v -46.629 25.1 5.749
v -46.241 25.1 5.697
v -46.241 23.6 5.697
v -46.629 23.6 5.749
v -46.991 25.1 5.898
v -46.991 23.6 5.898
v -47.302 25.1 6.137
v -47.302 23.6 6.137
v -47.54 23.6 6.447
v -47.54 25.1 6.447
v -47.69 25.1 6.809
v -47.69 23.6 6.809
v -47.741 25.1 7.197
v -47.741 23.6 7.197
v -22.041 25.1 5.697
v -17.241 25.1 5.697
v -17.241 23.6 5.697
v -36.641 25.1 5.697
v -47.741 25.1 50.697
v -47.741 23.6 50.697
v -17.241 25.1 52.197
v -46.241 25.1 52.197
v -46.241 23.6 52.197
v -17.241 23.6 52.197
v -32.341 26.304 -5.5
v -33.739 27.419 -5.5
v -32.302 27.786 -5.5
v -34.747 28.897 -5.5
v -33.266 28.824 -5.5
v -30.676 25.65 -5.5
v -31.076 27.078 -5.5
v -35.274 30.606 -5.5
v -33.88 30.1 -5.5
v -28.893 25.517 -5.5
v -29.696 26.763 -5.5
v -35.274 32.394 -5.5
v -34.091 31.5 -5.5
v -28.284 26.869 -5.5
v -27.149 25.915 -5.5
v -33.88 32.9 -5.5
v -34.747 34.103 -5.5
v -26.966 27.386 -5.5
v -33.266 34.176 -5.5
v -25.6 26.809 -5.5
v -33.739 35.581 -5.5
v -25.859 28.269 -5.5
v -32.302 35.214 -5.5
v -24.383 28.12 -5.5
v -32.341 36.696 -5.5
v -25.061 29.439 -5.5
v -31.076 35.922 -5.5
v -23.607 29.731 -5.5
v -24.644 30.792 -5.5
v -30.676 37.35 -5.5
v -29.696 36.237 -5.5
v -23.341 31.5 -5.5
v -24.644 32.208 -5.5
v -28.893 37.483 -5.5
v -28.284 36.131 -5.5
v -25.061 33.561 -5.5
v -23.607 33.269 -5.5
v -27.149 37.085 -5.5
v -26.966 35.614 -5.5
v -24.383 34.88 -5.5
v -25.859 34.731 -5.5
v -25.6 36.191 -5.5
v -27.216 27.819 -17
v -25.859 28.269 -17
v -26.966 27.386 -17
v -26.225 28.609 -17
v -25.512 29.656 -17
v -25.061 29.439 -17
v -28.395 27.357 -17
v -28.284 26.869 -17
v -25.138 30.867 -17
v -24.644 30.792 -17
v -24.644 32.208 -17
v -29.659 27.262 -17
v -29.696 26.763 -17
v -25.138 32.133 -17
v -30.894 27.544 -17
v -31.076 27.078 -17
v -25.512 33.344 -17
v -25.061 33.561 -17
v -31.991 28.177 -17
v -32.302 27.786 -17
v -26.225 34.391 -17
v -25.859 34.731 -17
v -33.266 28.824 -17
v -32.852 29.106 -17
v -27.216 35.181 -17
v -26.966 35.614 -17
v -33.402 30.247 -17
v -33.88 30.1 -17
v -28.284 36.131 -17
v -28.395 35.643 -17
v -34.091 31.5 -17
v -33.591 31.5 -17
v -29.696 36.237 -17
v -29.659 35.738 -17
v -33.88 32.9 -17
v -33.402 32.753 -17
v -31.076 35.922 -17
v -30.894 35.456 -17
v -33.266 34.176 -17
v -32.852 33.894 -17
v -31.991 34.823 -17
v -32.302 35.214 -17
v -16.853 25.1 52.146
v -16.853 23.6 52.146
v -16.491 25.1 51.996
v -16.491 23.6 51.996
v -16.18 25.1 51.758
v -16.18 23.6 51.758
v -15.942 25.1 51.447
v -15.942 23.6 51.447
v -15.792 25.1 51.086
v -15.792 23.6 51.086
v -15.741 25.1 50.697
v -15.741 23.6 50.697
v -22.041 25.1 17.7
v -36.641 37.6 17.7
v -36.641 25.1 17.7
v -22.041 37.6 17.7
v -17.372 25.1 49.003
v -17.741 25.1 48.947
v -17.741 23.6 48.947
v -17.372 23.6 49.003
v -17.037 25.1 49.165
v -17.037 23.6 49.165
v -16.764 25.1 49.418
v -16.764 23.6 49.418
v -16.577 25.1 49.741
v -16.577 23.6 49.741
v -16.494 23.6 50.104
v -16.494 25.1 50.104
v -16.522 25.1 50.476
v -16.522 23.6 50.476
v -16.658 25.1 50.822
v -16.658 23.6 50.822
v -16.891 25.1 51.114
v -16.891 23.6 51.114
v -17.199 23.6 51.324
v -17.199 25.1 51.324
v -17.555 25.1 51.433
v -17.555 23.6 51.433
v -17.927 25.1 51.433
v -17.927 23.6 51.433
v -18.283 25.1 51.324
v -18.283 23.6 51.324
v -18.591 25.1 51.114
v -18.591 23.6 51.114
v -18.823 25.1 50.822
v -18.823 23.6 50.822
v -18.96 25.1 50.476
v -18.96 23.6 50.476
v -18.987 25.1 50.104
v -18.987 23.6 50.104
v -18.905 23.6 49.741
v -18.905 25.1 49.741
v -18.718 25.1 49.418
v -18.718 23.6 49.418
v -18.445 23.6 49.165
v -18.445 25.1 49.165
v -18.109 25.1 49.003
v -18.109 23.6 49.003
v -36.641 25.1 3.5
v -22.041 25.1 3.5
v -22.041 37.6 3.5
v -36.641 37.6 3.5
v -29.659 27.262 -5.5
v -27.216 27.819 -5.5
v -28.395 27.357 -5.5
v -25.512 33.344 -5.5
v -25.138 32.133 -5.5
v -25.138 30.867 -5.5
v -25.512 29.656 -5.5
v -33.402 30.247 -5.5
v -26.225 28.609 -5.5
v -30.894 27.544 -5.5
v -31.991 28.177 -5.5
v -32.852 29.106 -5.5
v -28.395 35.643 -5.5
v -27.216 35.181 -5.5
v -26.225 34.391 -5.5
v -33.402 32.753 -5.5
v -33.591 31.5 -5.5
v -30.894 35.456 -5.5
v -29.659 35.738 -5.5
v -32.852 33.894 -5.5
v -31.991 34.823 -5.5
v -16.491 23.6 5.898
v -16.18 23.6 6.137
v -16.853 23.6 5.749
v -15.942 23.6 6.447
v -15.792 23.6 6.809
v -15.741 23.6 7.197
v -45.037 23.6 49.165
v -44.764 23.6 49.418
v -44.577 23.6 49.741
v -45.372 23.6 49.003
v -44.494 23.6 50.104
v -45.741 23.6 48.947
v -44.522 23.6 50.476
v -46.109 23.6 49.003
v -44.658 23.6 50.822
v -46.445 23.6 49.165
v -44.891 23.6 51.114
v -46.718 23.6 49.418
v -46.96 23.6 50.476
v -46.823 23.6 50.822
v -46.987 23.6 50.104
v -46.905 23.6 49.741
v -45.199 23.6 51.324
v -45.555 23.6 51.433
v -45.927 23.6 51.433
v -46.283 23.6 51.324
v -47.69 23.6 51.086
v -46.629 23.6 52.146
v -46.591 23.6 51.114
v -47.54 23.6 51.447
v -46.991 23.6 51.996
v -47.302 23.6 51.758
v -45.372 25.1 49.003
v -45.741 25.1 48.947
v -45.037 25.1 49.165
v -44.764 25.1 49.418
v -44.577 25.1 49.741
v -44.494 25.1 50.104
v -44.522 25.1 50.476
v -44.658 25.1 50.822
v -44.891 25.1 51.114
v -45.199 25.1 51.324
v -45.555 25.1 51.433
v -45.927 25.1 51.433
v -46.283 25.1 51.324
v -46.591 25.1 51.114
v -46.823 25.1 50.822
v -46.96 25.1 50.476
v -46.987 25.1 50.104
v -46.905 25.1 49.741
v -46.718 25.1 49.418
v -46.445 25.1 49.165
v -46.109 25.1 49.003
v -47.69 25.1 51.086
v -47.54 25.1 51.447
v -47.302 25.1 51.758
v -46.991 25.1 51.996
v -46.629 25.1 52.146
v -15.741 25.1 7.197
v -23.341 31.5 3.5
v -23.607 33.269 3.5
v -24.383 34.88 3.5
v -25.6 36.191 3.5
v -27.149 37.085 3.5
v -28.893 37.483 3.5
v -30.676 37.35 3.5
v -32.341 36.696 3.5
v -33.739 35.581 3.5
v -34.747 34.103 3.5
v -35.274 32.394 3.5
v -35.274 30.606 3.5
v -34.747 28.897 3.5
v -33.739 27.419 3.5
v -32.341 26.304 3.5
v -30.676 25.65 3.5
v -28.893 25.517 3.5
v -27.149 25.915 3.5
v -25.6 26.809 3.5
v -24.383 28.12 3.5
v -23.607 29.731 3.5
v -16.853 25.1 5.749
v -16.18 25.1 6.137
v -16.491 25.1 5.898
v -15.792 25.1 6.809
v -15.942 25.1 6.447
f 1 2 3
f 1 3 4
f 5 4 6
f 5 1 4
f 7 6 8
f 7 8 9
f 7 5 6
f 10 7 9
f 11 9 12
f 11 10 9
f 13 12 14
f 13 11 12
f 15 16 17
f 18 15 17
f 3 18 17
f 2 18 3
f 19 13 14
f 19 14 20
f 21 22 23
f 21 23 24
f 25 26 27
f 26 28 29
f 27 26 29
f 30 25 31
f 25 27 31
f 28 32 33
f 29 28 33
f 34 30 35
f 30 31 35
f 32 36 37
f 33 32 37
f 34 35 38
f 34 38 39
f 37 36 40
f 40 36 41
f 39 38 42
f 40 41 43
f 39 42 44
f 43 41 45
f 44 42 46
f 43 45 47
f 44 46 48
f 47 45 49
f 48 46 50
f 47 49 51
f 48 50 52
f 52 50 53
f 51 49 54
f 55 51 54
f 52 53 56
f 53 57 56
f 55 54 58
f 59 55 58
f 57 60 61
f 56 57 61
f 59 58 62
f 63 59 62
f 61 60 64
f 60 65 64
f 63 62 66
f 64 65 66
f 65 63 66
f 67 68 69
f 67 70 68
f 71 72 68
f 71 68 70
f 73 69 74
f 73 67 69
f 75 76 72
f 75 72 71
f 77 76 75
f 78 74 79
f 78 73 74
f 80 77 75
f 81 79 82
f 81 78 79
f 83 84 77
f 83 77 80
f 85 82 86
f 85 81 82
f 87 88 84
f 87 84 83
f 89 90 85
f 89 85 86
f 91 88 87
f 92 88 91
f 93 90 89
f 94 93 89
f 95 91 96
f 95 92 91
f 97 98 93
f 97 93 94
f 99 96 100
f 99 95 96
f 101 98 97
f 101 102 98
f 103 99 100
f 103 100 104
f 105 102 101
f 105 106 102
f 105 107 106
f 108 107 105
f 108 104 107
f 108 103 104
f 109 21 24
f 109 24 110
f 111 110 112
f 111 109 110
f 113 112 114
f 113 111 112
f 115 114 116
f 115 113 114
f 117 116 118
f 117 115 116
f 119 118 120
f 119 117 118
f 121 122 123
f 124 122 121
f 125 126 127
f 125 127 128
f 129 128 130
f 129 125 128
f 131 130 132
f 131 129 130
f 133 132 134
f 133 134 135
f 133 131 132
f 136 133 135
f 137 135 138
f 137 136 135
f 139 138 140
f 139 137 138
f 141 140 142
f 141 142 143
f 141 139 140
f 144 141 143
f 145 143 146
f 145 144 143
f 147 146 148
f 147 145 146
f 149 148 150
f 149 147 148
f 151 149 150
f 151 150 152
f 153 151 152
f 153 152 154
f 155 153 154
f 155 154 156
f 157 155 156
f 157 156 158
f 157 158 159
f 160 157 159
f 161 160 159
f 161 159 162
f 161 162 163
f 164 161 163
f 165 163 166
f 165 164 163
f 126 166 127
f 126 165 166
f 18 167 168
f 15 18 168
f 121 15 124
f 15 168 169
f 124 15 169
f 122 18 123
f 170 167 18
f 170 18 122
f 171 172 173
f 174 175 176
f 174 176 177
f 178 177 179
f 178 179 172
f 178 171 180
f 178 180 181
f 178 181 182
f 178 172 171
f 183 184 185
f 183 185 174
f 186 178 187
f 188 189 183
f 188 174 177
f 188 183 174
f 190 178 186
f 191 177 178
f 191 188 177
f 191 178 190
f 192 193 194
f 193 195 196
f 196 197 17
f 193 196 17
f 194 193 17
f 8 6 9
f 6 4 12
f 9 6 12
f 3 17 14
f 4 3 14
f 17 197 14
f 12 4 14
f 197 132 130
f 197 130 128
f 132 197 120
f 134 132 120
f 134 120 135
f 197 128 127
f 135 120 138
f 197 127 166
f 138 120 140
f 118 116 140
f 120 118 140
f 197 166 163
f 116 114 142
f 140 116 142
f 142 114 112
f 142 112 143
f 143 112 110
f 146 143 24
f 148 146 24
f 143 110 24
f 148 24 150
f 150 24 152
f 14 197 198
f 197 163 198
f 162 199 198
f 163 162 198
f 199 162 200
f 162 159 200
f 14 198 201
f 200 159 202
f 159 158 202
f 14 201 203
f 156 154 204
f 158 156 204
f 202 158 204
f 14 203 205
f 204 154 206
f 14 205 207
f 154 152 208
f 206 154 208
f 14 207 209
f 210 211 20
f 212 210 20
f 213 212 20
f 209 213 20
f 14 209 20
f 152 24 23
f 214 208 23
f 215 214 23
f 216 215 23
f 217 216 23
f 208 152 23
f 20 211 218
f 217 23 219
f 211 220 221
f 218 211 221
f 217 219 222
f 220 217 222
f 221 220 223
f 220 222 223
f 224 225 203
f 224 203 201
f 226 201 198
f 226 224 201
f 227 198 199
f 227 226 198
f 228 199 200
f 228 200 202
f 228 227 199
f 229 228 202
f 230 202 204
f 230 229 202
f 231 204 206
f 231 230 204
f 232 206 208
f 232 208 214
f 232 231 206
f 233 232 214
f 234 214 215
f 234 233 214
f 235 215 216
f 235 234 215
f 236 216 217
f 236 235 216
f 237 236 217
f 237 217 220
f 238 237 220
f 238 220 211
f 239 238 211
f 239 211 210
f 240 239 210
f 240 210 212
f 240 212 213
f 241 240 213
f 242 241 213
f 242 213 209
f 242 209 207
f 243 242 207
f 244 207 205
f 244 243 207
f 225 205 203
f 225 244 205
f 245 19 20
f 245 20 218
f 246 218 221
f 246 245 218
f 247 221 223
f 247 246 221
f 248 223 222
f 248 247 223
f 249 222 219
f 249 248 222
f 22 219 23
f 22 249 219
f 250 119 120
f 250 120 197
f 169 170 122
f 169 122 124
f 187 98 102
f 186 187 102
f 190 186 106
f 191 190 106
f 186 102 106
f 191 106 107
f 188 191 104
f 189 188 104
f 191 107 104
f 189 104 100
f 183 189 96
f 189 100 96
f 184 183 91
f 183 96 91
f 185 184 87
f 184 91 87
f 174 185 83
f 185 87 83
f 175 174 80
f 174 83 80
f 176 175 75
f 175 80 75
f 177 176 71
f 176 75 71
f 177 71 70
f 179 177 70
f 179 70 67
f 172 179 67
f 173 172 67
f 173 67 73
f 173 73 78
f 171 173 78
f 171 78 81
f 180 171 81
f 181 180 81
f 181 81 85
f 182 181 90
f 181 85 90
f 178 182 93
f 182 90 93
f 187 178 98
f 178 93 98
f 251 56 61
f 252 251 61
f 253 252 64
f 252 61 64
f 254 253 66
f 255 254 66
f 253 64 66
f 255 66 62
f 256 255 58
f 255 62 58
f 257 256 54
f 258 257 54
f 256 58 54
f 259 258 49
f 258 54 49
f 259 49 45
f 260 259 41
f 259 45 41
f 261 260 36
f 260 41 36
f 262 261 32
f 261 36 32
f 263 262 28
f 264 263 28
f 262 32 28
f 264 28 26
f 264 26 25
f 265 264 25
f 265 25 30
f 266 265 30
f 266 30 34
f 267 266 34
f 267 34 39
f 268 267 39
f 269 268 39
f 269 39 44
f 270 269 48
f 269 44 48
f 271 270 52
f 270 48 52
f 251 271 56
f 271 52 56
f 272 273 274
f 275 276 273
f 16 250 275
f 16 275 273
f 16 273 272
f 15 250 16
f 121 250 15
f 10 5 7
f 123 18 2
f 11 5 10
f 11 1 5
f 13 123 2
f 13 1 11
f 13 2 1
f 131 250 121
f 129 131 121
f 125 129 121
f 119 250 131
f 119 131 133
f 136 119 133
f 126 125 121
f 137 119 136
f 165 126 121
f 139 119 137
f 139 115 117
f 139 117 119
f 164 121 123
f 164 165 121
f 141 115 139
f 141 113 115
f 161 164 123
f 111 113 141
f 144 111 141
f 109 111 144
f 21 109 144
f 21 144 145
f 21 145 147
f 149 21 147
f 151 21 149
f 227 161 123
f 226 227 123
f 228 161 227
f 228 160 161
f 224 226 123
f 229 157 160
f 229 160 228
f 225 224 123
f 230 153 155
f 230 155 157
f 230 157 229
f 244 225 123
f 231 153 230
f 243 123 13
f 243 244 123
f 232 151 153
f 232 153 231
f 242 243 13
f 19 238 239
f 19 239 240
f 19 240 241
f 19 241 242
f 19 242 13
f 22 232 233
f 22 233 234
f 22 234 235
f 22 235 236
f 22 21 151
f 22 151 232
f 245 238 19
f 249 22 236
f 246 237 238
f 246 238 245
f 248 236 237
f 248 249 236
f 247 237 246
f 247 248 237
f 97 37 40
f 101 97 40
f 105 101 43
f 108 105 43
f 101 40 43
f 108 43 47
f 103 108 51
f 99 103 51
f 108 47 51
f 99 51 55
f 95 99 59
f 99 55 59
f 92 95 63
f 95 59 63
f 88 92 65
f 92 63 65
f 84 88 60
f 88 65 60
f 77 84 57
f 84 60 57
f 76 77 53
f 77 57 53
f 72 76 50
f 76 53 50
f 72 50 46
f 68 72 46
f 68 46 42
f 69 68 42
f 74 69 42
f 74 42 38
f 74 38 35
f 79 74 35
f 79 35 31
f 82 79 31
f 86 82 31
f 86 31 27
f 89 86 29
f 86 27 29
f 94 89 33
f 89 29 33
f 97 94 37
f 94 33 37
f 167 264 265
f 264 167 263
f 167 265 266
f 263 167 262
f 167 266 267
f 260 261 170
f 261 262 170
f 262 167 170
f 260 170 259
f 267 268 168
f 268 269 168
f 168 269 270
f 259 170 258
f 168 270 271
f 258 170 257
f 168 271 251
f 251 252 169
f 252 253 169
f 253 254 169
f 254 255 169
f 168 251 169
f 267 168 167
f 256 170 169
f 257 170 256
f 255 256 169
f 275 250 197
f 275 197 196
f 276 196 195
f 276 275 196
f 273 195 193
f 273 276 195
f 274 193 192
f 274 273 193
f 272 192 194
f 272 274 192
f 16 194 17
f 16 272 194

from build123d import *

# Parameters (mm, degrees)
EXTRUDE_1_DEPTH      = 3.5
EXTRUDE_1_DEPTH_BACK = 5.5
SKETCH_1_R           = 6
SKETCH_2_R           = 4.75
EXTRUDE_2_DEPTH      = 11.5
SKETCH_3_R           = 4.25
CUT_EXTRUDE_1_DEPTH  = 11.5
SKETCH_4_W           = 14.6
SKETCH_4_H           = 12.5
EXTRUDE_3_DEPTH      = 14.2
SKETCH_5_R           = 1.25
EXTRUDE_4_DEPTH      = 1.5


with BuildPart() as part:
    # 草圖1 → 填料-伸長1 (new, two sides: drawn at the far end of the back side and taken through both)
    with BuildSketch(Plane.XY.offset(-EXTRUDE_1_DEPTH_BACK)):
        with Locations((-29.340909091, 31.5)):
            Circle(SKETCH_1_R)
    extrude(amount=EXTRUDE_1_DEPTH + EXTRUDE_1_DEPTH_BACK)

    # 草圖2 → 填料-伸長2 (add)
    with BuildSketch(Plane(origin=(0, 0, -5.5), x_dir=(-1, 0, 0), z_dir=(0, 0, -1))):
        with Locations((29.340909091, 31.5)):
            Circle(SKETCH_2_R)
    extrude(amount=EXTRUDE_2_DEPTH)

    # 草圖3 → 除料-伸長1 (cut)
    with BuildSketch(Plane(origin=(0, 0, -17), x_dir=(-1, 0, 0), z_dir=(0, 0, -1))):
        with Locations((29.340909091, 31.5)):
            Circle(SKETCH_3_R)
    extrude(amount=-CUT_EXTRUDE_1_DEPTH, mode=Mode.SUBTRACT)

    # 草圖4 → 填料-伸長3 (add)
    with BuildSketch(Plane.XY.offset(3.5)):
        with Locations((-29.340909091, 31.35)):
            Rectangle(SKETCH_4_W, SKETCH_4_H)
    extrude(amount=EXTRUDE_3_DEPTH)

    # 草圖5 → 填料-伸長4 (add)
    with BuildSketch(Plane.XZ.offset(-25.1)):
        with BuildLine():
            Line((-17.240909091, 5.697422491), (-46.240909091, 5.697422491))
            ThreePointArc((-46.240909091, 5.697422491), (-47.301569263, 6.136762319), (-47.740909091, 7.197422491))
            Line((-47.740909091, 7.197422491), (-47.740909091, 50.697422491))
            ThreePointArc((-47.740909091, 50.697422491), (-47.301569263, 51.758082663), (-46.240909091, 52.197422491))
            Line((-46.240909091, 52.197422491), (-17.240909091, 52.197422491))
            ThreePointArc((-17.240909091, 52.197422491), (-16.180248919, 51.758082663), (-15.740909091, 50.697422491))
            Line((-15.740909091, 50.697422491), (-15.740909091, 7.197422491))
            ThreePointArc((-15.740909091, 7.197422491), (-16.180248919, 6.136762319), (-17.240909091, 5.697422491))
        make_face()
        with Locations(Location((-17.740909091, 50.197422491, 0), (0, 0, 270))):
            Circle(SKETCH_5_R, mode=Mode.SUBTRACT)
        with Locations(Location((-45.740909091, 50.197422491, 0), (0, 0, 270))):
            Circle(SKETCH_5_R, mode=Mode.SUBTRACT)
    extrude(amount=EXTRUDE_4_DEPTH)


solid = part.part
